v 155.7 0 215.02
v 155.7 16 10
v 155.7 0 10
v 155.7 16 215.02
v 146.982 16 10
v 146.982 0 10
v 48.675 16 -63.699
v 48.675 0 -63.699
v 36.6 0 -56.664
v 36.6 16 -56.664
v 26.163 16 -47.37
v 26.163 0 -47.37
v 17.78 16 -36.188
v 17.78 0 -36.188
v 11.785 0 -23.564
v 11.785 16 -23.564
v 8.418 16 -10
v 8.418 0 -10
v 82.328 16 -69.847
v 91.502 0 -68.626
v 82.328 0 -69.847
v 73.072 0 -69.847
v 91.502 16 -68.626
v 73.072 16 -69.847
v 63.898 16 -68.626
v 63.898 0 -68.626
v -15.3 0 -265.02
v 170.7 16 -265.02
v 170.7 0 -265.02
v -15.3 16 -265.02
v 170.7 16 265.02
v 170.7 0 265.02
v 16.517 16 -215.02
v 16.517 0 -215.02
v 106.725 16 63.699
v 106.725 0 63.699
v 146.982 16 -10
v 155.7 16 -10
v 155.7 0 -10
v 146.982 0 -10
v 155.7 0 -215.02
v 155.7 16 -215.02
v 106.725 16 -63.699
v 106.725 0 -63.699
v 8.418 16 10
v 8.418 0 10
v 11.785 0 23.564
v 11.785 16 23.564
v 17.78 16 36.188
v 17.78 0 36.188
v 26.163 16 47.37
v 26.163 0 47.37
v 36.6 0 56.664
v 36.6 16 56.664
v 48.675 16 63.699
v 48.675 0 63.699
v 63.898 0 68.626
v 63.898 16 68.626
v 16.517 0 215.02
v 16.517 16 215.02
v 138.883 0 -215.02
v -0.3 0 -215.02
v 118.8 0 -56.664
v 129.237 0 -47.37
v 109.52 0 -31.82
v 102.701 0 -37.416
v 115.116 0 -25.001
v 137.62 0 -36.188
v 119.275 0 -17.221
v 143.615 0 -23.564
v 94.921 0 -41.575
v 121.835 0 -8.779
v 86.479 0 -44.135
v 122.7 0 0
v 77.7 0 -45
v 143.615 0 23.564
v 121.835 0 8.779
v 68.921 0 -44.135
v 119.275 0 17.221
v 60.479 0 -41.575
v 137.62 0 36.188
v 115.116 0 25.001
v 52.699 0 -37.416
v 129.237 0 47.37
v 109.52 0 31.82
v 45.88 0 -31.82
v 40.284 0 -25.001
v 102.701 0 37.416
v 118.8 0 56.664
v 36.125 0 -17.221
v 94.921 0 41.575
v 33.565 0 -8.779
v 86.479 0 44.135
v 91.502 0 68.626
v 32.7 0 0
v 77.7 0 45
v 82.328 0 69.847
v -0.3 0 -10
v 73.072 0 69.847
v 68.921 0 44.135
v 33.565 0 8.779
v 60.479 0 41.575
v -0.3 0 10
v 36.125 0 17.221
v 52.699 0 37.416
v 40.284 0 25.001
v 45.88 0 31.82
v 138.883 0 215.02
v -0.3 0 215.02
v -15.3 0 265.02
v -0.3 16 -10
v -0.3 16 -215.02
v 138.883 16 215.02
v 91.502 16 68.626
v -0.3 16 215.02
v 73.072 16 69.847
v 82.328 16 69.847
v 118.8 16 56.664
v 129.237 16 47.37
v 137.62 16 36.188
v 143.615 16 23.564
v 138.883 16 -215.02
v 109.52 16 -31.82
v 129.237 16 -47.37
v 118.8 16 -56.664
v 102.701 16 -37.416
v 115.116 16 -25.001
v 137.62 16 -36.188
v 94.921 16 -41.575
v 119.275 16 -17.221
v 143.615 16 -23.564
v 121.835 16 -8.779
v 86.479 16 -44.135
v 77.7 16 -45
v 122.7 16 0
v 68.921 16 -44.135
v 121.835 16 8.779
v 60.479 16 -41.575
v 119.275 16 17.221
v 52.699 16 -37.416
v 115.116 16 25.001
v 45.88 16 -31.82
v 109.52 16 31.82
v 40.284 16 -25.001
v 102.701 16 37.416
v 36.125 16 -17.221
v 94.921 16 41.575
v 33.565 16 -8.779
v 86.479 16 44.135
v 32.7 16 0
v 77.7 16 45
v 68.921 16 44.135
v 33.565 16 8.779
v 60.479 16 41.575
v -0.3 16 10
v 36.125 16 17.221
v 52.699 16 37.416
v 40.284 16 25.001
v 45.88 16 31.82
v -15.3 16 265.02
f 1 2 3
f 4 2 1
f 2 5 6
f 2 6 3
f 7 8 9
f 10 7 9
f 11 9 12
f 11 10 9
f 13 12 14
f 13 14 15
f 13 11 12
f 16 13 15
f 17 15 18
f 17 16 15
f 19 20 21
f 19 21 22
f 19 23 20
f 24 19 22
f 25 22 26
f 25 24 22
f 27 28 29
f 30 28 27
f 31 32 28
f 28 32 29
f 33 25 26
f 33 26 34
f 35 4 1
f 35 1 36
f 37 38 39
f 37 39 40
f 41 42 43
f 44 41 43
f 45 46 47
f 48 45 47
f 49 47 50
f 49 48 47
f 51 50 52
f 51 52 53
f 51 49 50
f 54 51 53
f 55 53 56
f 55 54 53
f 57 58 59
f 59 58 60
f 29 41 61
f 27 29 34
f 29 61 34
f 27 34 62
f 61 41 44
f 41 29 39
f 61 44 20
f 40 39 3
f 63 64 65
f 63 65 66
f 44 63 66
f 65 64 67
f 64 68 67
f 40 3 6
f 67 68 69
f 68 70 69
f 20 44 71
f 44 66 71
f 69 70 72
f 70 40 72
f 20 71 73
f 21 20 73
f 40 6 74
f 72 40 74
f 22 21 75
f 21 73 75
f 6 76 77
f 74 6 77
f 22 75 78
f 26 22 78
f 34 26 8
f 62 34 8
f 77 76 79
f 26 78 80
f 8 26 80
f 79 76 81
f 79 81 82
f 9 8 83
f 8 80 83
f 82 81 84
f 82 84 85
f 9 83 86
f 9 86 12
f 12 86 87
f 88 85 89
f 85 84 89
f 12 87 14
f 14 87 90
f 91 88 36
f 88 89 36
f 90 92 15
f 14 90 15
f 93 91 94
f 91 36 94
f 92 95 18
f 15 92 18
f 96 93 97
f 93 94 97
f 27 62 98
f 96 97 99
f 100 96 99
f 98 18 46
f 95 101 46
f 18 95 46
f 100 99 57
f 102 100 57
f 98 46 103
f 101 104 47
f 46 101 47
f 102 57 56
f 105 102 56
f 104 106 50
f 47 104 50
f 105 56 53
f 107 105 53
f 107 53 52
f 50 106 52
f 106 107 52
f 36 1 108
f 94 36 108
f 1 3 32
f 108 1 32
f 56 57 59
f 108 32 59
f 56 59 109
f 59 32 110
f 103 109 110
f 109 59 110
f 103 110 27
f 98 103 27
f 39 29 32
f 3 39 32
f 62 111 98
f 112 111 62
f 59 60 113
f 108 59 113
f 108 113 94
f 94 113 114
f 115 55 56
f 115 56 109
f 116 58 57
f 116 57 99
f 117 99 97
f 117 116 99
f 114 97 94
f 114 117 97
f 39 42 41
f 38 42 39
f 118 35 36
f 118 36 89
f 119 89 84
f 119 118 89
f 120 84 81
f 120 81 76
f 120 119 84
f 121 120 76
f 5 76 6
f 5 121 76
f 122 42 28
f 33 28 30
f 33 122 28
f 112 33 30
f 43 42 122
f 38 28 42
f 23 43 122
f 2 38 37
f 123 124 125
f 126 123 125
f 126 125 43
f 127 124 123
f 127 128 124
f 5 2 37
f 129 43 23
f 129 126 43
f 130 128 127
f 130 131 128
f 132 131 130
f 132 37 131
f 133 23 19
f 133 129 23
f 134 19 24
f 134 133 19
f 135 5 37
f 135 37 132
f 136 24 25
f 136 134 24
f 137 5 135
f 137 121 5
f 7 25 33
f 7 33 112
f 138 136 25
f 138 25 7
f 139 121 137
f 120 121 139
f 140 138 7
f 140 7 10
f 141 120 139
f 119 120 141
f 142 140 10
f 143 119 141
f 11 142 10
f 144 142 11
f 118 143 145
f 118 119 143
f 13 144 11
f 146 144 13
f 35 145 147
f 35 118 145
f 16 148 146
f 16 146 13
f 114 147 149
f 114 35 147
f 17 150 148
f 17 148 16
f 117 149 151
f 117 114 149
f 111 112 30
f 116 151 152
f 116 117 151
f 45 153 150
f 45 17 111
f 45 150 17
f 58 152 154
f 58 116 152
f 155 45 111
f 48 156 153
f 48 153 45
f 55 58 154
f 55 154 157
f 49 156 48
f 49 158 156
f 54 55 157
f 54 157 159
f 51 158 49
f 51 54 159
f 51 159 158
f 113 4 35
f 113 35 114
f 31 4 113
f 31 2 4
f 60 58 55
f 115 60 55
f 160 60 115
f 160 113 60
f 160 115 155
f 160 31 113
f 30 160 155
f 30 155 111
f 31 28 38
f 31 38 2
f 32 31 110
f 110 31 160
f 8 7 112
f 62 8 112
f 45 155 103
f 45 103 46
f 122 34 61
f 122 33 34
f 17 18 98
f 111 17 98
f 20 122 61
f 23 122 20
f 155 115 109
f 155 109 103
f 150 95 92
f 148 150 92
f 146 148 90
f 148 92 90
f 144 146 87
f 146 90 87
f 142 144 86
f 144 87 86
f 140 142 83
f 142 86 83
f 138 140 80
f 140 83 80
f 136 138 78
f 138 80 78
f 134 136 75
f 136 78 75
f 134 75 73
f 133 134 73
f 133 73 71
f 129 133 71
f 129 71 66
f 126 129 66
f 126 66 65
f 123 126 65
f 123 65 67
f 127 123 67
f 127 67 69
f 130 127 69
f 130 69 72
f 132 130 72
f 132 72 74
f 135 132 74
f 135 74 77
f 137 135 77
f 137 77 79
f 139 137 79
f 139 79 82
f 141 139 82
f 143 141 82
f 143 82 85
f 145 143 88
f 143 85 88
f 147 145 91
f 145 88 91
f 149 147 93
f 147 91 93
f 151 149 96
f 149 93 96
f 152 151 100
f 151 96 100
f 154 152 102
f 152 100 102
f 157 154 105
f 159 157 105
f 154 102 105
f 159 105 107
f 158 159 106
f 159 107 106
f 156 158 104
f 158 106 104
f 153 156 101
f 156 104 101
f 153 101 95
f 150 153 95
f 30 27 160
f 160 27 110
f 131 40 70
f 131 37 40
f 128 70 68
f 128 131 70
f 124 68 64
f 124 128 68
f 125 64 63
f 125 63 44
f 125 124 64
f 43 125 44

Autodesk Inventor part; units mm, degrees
ref_plane "YZ Plane" through (0, 0, 0) normal (1, 0, 0) x (0, 1, 0)
ref_plane "XZ Plane" through (0, 0, 0) normal (0, 1, 0) x (-1, 0, 0)
ref_plane "XY Plane" through (0, 0, 0) normal (0, 0, 1) x (1, 0, 0)
sketch "Sketch1" plane through (0, 0, 0) normal (0, 1, 0) x (-1, 0, 0)
  line L0 (15.3, 271) -> (-170.7, 271)
  line L1 (-170.7, 271) -> (-170.7, -271)
  line L2 (-170.7, -271) -> (15.3, -271)
  line L3 (15.3, -271) -> (15.3, 271)
  line L4 (-77.7, 271) -> (-77.7, -271)
  line L5 (-170.7, 0) -> (15.3, 0)
  circle A0 centre (-77.7, 0) radius 45
  point P0 (0, 0)
  dimension "d0" = 542
  dimension "d1" = 186
  dimension "d2" = 90
extrude "Extrusion1" add sketch "Sketch1" along normal blind 16 contours L3 L5 A0 L4 L0 | L4 A0 L5 L1 L0 | L3 L2 L4 A0 L5 | L5 A0 L4 L2 L1
sketch "Sketch2" plane through (170.7, 0, 271) normal (1, 0, 0) x (0, 0, -1)
  line L0 (0, 0) -> (0, 16) projected
  line L1 (0, 6) -> (-25, 6)
  line L2 (-25, 6) -> (-25, 0)
  line L3 (-25, 0) -> (0, 0)
  line L4 (0, 0) -> (0, 6)
  line L5 (542, 0) -> (542, 16) projected
  line L6 (542, 6) -> (567, 6)
  line L7 (567, 6) -> (567, 0)
  line L8 (567, 0) -> (542, 0)
  line L9 (542, 0) -> (542, 6)
  line L10 (542, 16) -> (527, 16)
  line L11 (527, 16) -> (527, 66)
  line L12 (527, 66) -> (542, 66)
  line L13 (542, 66) -> (542, 16)
  line L14 (0, 16) -> (15, 16)
  line L15 (15, 16) -> (15, 66)
  line L16 (15, 66) -> (0, 66)
  line L17 (0, 66) -> (0, 16)
  point P0 (271, 0)
  dimension "d5" = 6
  dimension "d6" = 25
  dimension "d7" = 25
  dimension "d8" = 50
  dimension "d9" = 15
  dimension "d10" = 15
  dimension "d11" = 50
extrude "Extrusion2" add sketch "Sketch2" against normal up to surface (186 mm away)
sketch "Sketch3" plane through (0, 16, 0) normal (0, 1, 0) x (1, 0, 0)
  line L0 (170.7, 256) -> (-15.3, 256) projected
  line L1 (-15.3, 256) -> (-15.3, -256) projected
  line L2 (-15.3, -256) -> (170.7, -256) projected
  line L3 (170.7, -256) -> (170.7, 256) projected
  circle A0 centre (77.7, 0) radius 45 projected
  line L4 (-0.3, -241) -> (-0.3, 241)
  line L5 (-0.3, 241) -> (155.7, 241)
  line L6 (155.7, 241) -> (155.7, -241)
  line L7 (155.7, -241) -> (-0.3, -241)
  circle A1 centre (77.7, 0) radius 70
  line L8 (155.7, -241) -> (-0.3, 241)
  line L9 (155.7, 241) -> (-0.3, -241)
  line L10 (148.0887, 243.4634) -> (-7.9113, -238.5366)
  line L11 (163.3113, 238.5366) -> (7.3113, -243.4634)
  line L12 (148.0887, -243.4634) -> (-7.9113, 238.5366)
  line L13 (163.3113, -238.5366) -> (7.3113, 243.4634)
  line L14 (-0.3, -10) -> (155.7, -10)
  line L15 (155.7, -10) -> (155.7, 10)
  line L16 (155.7, 10) -> (-0.3, 10)
  line L17 (-0.3, 10) -> (-0.3, -10)
  point P0 (0, 0)
  point P1 (77.7, 0)
  point P2 (77.7, 0)
  point P3 (146.982, 10)
  point P4 (155.7, 215.0197)
  point P5 (106.7248, 63.699)
  point P6 (146.982, -10)
  point P7 (106.7248, -63.699)
  point P8 (155.7, -215.0197)
  point P9 (8.1086, 241)
  point P10 (63.8977, 68.6258)
  point P11 (91.5023, 68.6258)
  point P12 (147.2914, 241)
  point P13 (-0.3, 10)
  point P14 (8.418, 10)
  point P15 (48.6752, 63.699)
  point P16 (-0.3, 215.0197)
  point P17 (8.418, -10)
  point P18 (-0.3, -215.0197)
  point P19 (48.6752, -63.699)
  point P20 (147.2914, -241)
  point P21 (91.5023, -68.6258)
  point P22 (63.8977, -68.6258)
  point P23 (8.1086, -241)
  dimension "d14" = 25
  dimension "d15" = 15
  dimension "d16" = 10
  dimension "d17" = 10
  dimension "d18" = 8
  dimension "d19" = 8
  dimension "d20" = 8
  dimension "d21" = 8
extrude "Extrusion3" cut sketch "Sketch3" against normal blind 20 contours A1 L11 L6 L16 | L14 L6 L13 A1 | A1 L13 L5 L10 | L12 L7 L11 A1 | A1 L16 L4 L12 | L10 L4 L14 A1
sketch "Sketch4" plane through (0, 16, 0) normal (0, 1, 0) x (1, 0, 0)
  line L0 (-0.3, 10) -> (-0.3, 215.0197) projected
  line L1 (-0.3, 215.0197) -> (156, 215.0197)
  line L2 (156, 215.0197) -> (156, 245)
  line L3 (156, 245) -> (-0.3, 245)
  line L4 (-0.3, 245) -> (-0.3, 215.0197)
  line L5 (-0.3, -215.0197) -> (48.6752, -63.699) projected
  line L6 (-0.3, -215.0197) -> (158, -215.0197)
  line L7 (158, -215.0197) -> (158, -245)
  line L8 (158, -245) -> (-0.3, -245)
  line L9 (-0.3, -245) -> (-0.3, -215.0197)
  point P0 (0, 0)
extrude "Extrusion4" add sketch "Sketch4" against normal up to surface (16 mm away)
sketch "Sketch5" plane through (0, 16, 0) normal (0, 1, 0) x (1, 0, 0)
  line L0 (-72, -376) -> (216, -376)
  line L1 (216, -376) -> (216, -255.0197)
  line L2 (216, -255.0197) -> (-72, -255.0197)
  line L3 (-72, -255.0197) -> (-72, -376)
  line L4 (-67, 399) -> (218, 399)
  line L5 (218, 399) -> (218, 255.0197)
  line L6 (218, 255.0197) -> (-67, 255.0197)
  line L7 (-67, 255.0197) -> (-67, 399)
  line L8 (16.5171, 215.0197) -> (138.8829, 215.0197) projected
  line L9 (138.8829, -215.0197) -> (16.5171, -215.0197) projected
  point P0 (0, 0)
  dimension "d26" = 40
  dimension "d27" = 40
extrude "Extrusion5" cut sketch "Sketch5" along normal mid plane 100
sketch "Sketch6" plane through (0, 16, 0) normal (0, 1, 0) x (1, 0, 0)
  line L0 (-15.3, 255.0197) -> (-15.3, -255.0197) projected
  line L1 (-15.3, 255.0197) -> (170.7, 255.0197)
  line L2 (170.7, 255.0197) -> (170.7, 265.0197)
  line L3 (170.7, 265.0197) -> (-15.3, 265.0197)
  line L4 (-15.3, 265.0197) -> (-15.3, 255.0197)
  line L5 (-15.3, -255.0197) -> (170.7, -255.0197)
  line L6 (170.7, -255.0197) -> (170.7, -265.0197)
  line L7 (170.7, -265.0197) -> (-15.3, -265.0197)
  line L8 (-15.3, -265.0197) -> (-15.3, -255.0197)
  line L9 (-15.3, -255.0197) -> (170.7, -255.0197) projected
  point P0 (0, 0)
  dimension "d30" = 10
  dimension "d31" = 0
  dimension "d32" = 10
extrude "Extrusion6" add sketch "Sketch6" against normal up to surface (16 mm away)
properties part number "A_AxisKrovatka" material "Aluminum 6061"
